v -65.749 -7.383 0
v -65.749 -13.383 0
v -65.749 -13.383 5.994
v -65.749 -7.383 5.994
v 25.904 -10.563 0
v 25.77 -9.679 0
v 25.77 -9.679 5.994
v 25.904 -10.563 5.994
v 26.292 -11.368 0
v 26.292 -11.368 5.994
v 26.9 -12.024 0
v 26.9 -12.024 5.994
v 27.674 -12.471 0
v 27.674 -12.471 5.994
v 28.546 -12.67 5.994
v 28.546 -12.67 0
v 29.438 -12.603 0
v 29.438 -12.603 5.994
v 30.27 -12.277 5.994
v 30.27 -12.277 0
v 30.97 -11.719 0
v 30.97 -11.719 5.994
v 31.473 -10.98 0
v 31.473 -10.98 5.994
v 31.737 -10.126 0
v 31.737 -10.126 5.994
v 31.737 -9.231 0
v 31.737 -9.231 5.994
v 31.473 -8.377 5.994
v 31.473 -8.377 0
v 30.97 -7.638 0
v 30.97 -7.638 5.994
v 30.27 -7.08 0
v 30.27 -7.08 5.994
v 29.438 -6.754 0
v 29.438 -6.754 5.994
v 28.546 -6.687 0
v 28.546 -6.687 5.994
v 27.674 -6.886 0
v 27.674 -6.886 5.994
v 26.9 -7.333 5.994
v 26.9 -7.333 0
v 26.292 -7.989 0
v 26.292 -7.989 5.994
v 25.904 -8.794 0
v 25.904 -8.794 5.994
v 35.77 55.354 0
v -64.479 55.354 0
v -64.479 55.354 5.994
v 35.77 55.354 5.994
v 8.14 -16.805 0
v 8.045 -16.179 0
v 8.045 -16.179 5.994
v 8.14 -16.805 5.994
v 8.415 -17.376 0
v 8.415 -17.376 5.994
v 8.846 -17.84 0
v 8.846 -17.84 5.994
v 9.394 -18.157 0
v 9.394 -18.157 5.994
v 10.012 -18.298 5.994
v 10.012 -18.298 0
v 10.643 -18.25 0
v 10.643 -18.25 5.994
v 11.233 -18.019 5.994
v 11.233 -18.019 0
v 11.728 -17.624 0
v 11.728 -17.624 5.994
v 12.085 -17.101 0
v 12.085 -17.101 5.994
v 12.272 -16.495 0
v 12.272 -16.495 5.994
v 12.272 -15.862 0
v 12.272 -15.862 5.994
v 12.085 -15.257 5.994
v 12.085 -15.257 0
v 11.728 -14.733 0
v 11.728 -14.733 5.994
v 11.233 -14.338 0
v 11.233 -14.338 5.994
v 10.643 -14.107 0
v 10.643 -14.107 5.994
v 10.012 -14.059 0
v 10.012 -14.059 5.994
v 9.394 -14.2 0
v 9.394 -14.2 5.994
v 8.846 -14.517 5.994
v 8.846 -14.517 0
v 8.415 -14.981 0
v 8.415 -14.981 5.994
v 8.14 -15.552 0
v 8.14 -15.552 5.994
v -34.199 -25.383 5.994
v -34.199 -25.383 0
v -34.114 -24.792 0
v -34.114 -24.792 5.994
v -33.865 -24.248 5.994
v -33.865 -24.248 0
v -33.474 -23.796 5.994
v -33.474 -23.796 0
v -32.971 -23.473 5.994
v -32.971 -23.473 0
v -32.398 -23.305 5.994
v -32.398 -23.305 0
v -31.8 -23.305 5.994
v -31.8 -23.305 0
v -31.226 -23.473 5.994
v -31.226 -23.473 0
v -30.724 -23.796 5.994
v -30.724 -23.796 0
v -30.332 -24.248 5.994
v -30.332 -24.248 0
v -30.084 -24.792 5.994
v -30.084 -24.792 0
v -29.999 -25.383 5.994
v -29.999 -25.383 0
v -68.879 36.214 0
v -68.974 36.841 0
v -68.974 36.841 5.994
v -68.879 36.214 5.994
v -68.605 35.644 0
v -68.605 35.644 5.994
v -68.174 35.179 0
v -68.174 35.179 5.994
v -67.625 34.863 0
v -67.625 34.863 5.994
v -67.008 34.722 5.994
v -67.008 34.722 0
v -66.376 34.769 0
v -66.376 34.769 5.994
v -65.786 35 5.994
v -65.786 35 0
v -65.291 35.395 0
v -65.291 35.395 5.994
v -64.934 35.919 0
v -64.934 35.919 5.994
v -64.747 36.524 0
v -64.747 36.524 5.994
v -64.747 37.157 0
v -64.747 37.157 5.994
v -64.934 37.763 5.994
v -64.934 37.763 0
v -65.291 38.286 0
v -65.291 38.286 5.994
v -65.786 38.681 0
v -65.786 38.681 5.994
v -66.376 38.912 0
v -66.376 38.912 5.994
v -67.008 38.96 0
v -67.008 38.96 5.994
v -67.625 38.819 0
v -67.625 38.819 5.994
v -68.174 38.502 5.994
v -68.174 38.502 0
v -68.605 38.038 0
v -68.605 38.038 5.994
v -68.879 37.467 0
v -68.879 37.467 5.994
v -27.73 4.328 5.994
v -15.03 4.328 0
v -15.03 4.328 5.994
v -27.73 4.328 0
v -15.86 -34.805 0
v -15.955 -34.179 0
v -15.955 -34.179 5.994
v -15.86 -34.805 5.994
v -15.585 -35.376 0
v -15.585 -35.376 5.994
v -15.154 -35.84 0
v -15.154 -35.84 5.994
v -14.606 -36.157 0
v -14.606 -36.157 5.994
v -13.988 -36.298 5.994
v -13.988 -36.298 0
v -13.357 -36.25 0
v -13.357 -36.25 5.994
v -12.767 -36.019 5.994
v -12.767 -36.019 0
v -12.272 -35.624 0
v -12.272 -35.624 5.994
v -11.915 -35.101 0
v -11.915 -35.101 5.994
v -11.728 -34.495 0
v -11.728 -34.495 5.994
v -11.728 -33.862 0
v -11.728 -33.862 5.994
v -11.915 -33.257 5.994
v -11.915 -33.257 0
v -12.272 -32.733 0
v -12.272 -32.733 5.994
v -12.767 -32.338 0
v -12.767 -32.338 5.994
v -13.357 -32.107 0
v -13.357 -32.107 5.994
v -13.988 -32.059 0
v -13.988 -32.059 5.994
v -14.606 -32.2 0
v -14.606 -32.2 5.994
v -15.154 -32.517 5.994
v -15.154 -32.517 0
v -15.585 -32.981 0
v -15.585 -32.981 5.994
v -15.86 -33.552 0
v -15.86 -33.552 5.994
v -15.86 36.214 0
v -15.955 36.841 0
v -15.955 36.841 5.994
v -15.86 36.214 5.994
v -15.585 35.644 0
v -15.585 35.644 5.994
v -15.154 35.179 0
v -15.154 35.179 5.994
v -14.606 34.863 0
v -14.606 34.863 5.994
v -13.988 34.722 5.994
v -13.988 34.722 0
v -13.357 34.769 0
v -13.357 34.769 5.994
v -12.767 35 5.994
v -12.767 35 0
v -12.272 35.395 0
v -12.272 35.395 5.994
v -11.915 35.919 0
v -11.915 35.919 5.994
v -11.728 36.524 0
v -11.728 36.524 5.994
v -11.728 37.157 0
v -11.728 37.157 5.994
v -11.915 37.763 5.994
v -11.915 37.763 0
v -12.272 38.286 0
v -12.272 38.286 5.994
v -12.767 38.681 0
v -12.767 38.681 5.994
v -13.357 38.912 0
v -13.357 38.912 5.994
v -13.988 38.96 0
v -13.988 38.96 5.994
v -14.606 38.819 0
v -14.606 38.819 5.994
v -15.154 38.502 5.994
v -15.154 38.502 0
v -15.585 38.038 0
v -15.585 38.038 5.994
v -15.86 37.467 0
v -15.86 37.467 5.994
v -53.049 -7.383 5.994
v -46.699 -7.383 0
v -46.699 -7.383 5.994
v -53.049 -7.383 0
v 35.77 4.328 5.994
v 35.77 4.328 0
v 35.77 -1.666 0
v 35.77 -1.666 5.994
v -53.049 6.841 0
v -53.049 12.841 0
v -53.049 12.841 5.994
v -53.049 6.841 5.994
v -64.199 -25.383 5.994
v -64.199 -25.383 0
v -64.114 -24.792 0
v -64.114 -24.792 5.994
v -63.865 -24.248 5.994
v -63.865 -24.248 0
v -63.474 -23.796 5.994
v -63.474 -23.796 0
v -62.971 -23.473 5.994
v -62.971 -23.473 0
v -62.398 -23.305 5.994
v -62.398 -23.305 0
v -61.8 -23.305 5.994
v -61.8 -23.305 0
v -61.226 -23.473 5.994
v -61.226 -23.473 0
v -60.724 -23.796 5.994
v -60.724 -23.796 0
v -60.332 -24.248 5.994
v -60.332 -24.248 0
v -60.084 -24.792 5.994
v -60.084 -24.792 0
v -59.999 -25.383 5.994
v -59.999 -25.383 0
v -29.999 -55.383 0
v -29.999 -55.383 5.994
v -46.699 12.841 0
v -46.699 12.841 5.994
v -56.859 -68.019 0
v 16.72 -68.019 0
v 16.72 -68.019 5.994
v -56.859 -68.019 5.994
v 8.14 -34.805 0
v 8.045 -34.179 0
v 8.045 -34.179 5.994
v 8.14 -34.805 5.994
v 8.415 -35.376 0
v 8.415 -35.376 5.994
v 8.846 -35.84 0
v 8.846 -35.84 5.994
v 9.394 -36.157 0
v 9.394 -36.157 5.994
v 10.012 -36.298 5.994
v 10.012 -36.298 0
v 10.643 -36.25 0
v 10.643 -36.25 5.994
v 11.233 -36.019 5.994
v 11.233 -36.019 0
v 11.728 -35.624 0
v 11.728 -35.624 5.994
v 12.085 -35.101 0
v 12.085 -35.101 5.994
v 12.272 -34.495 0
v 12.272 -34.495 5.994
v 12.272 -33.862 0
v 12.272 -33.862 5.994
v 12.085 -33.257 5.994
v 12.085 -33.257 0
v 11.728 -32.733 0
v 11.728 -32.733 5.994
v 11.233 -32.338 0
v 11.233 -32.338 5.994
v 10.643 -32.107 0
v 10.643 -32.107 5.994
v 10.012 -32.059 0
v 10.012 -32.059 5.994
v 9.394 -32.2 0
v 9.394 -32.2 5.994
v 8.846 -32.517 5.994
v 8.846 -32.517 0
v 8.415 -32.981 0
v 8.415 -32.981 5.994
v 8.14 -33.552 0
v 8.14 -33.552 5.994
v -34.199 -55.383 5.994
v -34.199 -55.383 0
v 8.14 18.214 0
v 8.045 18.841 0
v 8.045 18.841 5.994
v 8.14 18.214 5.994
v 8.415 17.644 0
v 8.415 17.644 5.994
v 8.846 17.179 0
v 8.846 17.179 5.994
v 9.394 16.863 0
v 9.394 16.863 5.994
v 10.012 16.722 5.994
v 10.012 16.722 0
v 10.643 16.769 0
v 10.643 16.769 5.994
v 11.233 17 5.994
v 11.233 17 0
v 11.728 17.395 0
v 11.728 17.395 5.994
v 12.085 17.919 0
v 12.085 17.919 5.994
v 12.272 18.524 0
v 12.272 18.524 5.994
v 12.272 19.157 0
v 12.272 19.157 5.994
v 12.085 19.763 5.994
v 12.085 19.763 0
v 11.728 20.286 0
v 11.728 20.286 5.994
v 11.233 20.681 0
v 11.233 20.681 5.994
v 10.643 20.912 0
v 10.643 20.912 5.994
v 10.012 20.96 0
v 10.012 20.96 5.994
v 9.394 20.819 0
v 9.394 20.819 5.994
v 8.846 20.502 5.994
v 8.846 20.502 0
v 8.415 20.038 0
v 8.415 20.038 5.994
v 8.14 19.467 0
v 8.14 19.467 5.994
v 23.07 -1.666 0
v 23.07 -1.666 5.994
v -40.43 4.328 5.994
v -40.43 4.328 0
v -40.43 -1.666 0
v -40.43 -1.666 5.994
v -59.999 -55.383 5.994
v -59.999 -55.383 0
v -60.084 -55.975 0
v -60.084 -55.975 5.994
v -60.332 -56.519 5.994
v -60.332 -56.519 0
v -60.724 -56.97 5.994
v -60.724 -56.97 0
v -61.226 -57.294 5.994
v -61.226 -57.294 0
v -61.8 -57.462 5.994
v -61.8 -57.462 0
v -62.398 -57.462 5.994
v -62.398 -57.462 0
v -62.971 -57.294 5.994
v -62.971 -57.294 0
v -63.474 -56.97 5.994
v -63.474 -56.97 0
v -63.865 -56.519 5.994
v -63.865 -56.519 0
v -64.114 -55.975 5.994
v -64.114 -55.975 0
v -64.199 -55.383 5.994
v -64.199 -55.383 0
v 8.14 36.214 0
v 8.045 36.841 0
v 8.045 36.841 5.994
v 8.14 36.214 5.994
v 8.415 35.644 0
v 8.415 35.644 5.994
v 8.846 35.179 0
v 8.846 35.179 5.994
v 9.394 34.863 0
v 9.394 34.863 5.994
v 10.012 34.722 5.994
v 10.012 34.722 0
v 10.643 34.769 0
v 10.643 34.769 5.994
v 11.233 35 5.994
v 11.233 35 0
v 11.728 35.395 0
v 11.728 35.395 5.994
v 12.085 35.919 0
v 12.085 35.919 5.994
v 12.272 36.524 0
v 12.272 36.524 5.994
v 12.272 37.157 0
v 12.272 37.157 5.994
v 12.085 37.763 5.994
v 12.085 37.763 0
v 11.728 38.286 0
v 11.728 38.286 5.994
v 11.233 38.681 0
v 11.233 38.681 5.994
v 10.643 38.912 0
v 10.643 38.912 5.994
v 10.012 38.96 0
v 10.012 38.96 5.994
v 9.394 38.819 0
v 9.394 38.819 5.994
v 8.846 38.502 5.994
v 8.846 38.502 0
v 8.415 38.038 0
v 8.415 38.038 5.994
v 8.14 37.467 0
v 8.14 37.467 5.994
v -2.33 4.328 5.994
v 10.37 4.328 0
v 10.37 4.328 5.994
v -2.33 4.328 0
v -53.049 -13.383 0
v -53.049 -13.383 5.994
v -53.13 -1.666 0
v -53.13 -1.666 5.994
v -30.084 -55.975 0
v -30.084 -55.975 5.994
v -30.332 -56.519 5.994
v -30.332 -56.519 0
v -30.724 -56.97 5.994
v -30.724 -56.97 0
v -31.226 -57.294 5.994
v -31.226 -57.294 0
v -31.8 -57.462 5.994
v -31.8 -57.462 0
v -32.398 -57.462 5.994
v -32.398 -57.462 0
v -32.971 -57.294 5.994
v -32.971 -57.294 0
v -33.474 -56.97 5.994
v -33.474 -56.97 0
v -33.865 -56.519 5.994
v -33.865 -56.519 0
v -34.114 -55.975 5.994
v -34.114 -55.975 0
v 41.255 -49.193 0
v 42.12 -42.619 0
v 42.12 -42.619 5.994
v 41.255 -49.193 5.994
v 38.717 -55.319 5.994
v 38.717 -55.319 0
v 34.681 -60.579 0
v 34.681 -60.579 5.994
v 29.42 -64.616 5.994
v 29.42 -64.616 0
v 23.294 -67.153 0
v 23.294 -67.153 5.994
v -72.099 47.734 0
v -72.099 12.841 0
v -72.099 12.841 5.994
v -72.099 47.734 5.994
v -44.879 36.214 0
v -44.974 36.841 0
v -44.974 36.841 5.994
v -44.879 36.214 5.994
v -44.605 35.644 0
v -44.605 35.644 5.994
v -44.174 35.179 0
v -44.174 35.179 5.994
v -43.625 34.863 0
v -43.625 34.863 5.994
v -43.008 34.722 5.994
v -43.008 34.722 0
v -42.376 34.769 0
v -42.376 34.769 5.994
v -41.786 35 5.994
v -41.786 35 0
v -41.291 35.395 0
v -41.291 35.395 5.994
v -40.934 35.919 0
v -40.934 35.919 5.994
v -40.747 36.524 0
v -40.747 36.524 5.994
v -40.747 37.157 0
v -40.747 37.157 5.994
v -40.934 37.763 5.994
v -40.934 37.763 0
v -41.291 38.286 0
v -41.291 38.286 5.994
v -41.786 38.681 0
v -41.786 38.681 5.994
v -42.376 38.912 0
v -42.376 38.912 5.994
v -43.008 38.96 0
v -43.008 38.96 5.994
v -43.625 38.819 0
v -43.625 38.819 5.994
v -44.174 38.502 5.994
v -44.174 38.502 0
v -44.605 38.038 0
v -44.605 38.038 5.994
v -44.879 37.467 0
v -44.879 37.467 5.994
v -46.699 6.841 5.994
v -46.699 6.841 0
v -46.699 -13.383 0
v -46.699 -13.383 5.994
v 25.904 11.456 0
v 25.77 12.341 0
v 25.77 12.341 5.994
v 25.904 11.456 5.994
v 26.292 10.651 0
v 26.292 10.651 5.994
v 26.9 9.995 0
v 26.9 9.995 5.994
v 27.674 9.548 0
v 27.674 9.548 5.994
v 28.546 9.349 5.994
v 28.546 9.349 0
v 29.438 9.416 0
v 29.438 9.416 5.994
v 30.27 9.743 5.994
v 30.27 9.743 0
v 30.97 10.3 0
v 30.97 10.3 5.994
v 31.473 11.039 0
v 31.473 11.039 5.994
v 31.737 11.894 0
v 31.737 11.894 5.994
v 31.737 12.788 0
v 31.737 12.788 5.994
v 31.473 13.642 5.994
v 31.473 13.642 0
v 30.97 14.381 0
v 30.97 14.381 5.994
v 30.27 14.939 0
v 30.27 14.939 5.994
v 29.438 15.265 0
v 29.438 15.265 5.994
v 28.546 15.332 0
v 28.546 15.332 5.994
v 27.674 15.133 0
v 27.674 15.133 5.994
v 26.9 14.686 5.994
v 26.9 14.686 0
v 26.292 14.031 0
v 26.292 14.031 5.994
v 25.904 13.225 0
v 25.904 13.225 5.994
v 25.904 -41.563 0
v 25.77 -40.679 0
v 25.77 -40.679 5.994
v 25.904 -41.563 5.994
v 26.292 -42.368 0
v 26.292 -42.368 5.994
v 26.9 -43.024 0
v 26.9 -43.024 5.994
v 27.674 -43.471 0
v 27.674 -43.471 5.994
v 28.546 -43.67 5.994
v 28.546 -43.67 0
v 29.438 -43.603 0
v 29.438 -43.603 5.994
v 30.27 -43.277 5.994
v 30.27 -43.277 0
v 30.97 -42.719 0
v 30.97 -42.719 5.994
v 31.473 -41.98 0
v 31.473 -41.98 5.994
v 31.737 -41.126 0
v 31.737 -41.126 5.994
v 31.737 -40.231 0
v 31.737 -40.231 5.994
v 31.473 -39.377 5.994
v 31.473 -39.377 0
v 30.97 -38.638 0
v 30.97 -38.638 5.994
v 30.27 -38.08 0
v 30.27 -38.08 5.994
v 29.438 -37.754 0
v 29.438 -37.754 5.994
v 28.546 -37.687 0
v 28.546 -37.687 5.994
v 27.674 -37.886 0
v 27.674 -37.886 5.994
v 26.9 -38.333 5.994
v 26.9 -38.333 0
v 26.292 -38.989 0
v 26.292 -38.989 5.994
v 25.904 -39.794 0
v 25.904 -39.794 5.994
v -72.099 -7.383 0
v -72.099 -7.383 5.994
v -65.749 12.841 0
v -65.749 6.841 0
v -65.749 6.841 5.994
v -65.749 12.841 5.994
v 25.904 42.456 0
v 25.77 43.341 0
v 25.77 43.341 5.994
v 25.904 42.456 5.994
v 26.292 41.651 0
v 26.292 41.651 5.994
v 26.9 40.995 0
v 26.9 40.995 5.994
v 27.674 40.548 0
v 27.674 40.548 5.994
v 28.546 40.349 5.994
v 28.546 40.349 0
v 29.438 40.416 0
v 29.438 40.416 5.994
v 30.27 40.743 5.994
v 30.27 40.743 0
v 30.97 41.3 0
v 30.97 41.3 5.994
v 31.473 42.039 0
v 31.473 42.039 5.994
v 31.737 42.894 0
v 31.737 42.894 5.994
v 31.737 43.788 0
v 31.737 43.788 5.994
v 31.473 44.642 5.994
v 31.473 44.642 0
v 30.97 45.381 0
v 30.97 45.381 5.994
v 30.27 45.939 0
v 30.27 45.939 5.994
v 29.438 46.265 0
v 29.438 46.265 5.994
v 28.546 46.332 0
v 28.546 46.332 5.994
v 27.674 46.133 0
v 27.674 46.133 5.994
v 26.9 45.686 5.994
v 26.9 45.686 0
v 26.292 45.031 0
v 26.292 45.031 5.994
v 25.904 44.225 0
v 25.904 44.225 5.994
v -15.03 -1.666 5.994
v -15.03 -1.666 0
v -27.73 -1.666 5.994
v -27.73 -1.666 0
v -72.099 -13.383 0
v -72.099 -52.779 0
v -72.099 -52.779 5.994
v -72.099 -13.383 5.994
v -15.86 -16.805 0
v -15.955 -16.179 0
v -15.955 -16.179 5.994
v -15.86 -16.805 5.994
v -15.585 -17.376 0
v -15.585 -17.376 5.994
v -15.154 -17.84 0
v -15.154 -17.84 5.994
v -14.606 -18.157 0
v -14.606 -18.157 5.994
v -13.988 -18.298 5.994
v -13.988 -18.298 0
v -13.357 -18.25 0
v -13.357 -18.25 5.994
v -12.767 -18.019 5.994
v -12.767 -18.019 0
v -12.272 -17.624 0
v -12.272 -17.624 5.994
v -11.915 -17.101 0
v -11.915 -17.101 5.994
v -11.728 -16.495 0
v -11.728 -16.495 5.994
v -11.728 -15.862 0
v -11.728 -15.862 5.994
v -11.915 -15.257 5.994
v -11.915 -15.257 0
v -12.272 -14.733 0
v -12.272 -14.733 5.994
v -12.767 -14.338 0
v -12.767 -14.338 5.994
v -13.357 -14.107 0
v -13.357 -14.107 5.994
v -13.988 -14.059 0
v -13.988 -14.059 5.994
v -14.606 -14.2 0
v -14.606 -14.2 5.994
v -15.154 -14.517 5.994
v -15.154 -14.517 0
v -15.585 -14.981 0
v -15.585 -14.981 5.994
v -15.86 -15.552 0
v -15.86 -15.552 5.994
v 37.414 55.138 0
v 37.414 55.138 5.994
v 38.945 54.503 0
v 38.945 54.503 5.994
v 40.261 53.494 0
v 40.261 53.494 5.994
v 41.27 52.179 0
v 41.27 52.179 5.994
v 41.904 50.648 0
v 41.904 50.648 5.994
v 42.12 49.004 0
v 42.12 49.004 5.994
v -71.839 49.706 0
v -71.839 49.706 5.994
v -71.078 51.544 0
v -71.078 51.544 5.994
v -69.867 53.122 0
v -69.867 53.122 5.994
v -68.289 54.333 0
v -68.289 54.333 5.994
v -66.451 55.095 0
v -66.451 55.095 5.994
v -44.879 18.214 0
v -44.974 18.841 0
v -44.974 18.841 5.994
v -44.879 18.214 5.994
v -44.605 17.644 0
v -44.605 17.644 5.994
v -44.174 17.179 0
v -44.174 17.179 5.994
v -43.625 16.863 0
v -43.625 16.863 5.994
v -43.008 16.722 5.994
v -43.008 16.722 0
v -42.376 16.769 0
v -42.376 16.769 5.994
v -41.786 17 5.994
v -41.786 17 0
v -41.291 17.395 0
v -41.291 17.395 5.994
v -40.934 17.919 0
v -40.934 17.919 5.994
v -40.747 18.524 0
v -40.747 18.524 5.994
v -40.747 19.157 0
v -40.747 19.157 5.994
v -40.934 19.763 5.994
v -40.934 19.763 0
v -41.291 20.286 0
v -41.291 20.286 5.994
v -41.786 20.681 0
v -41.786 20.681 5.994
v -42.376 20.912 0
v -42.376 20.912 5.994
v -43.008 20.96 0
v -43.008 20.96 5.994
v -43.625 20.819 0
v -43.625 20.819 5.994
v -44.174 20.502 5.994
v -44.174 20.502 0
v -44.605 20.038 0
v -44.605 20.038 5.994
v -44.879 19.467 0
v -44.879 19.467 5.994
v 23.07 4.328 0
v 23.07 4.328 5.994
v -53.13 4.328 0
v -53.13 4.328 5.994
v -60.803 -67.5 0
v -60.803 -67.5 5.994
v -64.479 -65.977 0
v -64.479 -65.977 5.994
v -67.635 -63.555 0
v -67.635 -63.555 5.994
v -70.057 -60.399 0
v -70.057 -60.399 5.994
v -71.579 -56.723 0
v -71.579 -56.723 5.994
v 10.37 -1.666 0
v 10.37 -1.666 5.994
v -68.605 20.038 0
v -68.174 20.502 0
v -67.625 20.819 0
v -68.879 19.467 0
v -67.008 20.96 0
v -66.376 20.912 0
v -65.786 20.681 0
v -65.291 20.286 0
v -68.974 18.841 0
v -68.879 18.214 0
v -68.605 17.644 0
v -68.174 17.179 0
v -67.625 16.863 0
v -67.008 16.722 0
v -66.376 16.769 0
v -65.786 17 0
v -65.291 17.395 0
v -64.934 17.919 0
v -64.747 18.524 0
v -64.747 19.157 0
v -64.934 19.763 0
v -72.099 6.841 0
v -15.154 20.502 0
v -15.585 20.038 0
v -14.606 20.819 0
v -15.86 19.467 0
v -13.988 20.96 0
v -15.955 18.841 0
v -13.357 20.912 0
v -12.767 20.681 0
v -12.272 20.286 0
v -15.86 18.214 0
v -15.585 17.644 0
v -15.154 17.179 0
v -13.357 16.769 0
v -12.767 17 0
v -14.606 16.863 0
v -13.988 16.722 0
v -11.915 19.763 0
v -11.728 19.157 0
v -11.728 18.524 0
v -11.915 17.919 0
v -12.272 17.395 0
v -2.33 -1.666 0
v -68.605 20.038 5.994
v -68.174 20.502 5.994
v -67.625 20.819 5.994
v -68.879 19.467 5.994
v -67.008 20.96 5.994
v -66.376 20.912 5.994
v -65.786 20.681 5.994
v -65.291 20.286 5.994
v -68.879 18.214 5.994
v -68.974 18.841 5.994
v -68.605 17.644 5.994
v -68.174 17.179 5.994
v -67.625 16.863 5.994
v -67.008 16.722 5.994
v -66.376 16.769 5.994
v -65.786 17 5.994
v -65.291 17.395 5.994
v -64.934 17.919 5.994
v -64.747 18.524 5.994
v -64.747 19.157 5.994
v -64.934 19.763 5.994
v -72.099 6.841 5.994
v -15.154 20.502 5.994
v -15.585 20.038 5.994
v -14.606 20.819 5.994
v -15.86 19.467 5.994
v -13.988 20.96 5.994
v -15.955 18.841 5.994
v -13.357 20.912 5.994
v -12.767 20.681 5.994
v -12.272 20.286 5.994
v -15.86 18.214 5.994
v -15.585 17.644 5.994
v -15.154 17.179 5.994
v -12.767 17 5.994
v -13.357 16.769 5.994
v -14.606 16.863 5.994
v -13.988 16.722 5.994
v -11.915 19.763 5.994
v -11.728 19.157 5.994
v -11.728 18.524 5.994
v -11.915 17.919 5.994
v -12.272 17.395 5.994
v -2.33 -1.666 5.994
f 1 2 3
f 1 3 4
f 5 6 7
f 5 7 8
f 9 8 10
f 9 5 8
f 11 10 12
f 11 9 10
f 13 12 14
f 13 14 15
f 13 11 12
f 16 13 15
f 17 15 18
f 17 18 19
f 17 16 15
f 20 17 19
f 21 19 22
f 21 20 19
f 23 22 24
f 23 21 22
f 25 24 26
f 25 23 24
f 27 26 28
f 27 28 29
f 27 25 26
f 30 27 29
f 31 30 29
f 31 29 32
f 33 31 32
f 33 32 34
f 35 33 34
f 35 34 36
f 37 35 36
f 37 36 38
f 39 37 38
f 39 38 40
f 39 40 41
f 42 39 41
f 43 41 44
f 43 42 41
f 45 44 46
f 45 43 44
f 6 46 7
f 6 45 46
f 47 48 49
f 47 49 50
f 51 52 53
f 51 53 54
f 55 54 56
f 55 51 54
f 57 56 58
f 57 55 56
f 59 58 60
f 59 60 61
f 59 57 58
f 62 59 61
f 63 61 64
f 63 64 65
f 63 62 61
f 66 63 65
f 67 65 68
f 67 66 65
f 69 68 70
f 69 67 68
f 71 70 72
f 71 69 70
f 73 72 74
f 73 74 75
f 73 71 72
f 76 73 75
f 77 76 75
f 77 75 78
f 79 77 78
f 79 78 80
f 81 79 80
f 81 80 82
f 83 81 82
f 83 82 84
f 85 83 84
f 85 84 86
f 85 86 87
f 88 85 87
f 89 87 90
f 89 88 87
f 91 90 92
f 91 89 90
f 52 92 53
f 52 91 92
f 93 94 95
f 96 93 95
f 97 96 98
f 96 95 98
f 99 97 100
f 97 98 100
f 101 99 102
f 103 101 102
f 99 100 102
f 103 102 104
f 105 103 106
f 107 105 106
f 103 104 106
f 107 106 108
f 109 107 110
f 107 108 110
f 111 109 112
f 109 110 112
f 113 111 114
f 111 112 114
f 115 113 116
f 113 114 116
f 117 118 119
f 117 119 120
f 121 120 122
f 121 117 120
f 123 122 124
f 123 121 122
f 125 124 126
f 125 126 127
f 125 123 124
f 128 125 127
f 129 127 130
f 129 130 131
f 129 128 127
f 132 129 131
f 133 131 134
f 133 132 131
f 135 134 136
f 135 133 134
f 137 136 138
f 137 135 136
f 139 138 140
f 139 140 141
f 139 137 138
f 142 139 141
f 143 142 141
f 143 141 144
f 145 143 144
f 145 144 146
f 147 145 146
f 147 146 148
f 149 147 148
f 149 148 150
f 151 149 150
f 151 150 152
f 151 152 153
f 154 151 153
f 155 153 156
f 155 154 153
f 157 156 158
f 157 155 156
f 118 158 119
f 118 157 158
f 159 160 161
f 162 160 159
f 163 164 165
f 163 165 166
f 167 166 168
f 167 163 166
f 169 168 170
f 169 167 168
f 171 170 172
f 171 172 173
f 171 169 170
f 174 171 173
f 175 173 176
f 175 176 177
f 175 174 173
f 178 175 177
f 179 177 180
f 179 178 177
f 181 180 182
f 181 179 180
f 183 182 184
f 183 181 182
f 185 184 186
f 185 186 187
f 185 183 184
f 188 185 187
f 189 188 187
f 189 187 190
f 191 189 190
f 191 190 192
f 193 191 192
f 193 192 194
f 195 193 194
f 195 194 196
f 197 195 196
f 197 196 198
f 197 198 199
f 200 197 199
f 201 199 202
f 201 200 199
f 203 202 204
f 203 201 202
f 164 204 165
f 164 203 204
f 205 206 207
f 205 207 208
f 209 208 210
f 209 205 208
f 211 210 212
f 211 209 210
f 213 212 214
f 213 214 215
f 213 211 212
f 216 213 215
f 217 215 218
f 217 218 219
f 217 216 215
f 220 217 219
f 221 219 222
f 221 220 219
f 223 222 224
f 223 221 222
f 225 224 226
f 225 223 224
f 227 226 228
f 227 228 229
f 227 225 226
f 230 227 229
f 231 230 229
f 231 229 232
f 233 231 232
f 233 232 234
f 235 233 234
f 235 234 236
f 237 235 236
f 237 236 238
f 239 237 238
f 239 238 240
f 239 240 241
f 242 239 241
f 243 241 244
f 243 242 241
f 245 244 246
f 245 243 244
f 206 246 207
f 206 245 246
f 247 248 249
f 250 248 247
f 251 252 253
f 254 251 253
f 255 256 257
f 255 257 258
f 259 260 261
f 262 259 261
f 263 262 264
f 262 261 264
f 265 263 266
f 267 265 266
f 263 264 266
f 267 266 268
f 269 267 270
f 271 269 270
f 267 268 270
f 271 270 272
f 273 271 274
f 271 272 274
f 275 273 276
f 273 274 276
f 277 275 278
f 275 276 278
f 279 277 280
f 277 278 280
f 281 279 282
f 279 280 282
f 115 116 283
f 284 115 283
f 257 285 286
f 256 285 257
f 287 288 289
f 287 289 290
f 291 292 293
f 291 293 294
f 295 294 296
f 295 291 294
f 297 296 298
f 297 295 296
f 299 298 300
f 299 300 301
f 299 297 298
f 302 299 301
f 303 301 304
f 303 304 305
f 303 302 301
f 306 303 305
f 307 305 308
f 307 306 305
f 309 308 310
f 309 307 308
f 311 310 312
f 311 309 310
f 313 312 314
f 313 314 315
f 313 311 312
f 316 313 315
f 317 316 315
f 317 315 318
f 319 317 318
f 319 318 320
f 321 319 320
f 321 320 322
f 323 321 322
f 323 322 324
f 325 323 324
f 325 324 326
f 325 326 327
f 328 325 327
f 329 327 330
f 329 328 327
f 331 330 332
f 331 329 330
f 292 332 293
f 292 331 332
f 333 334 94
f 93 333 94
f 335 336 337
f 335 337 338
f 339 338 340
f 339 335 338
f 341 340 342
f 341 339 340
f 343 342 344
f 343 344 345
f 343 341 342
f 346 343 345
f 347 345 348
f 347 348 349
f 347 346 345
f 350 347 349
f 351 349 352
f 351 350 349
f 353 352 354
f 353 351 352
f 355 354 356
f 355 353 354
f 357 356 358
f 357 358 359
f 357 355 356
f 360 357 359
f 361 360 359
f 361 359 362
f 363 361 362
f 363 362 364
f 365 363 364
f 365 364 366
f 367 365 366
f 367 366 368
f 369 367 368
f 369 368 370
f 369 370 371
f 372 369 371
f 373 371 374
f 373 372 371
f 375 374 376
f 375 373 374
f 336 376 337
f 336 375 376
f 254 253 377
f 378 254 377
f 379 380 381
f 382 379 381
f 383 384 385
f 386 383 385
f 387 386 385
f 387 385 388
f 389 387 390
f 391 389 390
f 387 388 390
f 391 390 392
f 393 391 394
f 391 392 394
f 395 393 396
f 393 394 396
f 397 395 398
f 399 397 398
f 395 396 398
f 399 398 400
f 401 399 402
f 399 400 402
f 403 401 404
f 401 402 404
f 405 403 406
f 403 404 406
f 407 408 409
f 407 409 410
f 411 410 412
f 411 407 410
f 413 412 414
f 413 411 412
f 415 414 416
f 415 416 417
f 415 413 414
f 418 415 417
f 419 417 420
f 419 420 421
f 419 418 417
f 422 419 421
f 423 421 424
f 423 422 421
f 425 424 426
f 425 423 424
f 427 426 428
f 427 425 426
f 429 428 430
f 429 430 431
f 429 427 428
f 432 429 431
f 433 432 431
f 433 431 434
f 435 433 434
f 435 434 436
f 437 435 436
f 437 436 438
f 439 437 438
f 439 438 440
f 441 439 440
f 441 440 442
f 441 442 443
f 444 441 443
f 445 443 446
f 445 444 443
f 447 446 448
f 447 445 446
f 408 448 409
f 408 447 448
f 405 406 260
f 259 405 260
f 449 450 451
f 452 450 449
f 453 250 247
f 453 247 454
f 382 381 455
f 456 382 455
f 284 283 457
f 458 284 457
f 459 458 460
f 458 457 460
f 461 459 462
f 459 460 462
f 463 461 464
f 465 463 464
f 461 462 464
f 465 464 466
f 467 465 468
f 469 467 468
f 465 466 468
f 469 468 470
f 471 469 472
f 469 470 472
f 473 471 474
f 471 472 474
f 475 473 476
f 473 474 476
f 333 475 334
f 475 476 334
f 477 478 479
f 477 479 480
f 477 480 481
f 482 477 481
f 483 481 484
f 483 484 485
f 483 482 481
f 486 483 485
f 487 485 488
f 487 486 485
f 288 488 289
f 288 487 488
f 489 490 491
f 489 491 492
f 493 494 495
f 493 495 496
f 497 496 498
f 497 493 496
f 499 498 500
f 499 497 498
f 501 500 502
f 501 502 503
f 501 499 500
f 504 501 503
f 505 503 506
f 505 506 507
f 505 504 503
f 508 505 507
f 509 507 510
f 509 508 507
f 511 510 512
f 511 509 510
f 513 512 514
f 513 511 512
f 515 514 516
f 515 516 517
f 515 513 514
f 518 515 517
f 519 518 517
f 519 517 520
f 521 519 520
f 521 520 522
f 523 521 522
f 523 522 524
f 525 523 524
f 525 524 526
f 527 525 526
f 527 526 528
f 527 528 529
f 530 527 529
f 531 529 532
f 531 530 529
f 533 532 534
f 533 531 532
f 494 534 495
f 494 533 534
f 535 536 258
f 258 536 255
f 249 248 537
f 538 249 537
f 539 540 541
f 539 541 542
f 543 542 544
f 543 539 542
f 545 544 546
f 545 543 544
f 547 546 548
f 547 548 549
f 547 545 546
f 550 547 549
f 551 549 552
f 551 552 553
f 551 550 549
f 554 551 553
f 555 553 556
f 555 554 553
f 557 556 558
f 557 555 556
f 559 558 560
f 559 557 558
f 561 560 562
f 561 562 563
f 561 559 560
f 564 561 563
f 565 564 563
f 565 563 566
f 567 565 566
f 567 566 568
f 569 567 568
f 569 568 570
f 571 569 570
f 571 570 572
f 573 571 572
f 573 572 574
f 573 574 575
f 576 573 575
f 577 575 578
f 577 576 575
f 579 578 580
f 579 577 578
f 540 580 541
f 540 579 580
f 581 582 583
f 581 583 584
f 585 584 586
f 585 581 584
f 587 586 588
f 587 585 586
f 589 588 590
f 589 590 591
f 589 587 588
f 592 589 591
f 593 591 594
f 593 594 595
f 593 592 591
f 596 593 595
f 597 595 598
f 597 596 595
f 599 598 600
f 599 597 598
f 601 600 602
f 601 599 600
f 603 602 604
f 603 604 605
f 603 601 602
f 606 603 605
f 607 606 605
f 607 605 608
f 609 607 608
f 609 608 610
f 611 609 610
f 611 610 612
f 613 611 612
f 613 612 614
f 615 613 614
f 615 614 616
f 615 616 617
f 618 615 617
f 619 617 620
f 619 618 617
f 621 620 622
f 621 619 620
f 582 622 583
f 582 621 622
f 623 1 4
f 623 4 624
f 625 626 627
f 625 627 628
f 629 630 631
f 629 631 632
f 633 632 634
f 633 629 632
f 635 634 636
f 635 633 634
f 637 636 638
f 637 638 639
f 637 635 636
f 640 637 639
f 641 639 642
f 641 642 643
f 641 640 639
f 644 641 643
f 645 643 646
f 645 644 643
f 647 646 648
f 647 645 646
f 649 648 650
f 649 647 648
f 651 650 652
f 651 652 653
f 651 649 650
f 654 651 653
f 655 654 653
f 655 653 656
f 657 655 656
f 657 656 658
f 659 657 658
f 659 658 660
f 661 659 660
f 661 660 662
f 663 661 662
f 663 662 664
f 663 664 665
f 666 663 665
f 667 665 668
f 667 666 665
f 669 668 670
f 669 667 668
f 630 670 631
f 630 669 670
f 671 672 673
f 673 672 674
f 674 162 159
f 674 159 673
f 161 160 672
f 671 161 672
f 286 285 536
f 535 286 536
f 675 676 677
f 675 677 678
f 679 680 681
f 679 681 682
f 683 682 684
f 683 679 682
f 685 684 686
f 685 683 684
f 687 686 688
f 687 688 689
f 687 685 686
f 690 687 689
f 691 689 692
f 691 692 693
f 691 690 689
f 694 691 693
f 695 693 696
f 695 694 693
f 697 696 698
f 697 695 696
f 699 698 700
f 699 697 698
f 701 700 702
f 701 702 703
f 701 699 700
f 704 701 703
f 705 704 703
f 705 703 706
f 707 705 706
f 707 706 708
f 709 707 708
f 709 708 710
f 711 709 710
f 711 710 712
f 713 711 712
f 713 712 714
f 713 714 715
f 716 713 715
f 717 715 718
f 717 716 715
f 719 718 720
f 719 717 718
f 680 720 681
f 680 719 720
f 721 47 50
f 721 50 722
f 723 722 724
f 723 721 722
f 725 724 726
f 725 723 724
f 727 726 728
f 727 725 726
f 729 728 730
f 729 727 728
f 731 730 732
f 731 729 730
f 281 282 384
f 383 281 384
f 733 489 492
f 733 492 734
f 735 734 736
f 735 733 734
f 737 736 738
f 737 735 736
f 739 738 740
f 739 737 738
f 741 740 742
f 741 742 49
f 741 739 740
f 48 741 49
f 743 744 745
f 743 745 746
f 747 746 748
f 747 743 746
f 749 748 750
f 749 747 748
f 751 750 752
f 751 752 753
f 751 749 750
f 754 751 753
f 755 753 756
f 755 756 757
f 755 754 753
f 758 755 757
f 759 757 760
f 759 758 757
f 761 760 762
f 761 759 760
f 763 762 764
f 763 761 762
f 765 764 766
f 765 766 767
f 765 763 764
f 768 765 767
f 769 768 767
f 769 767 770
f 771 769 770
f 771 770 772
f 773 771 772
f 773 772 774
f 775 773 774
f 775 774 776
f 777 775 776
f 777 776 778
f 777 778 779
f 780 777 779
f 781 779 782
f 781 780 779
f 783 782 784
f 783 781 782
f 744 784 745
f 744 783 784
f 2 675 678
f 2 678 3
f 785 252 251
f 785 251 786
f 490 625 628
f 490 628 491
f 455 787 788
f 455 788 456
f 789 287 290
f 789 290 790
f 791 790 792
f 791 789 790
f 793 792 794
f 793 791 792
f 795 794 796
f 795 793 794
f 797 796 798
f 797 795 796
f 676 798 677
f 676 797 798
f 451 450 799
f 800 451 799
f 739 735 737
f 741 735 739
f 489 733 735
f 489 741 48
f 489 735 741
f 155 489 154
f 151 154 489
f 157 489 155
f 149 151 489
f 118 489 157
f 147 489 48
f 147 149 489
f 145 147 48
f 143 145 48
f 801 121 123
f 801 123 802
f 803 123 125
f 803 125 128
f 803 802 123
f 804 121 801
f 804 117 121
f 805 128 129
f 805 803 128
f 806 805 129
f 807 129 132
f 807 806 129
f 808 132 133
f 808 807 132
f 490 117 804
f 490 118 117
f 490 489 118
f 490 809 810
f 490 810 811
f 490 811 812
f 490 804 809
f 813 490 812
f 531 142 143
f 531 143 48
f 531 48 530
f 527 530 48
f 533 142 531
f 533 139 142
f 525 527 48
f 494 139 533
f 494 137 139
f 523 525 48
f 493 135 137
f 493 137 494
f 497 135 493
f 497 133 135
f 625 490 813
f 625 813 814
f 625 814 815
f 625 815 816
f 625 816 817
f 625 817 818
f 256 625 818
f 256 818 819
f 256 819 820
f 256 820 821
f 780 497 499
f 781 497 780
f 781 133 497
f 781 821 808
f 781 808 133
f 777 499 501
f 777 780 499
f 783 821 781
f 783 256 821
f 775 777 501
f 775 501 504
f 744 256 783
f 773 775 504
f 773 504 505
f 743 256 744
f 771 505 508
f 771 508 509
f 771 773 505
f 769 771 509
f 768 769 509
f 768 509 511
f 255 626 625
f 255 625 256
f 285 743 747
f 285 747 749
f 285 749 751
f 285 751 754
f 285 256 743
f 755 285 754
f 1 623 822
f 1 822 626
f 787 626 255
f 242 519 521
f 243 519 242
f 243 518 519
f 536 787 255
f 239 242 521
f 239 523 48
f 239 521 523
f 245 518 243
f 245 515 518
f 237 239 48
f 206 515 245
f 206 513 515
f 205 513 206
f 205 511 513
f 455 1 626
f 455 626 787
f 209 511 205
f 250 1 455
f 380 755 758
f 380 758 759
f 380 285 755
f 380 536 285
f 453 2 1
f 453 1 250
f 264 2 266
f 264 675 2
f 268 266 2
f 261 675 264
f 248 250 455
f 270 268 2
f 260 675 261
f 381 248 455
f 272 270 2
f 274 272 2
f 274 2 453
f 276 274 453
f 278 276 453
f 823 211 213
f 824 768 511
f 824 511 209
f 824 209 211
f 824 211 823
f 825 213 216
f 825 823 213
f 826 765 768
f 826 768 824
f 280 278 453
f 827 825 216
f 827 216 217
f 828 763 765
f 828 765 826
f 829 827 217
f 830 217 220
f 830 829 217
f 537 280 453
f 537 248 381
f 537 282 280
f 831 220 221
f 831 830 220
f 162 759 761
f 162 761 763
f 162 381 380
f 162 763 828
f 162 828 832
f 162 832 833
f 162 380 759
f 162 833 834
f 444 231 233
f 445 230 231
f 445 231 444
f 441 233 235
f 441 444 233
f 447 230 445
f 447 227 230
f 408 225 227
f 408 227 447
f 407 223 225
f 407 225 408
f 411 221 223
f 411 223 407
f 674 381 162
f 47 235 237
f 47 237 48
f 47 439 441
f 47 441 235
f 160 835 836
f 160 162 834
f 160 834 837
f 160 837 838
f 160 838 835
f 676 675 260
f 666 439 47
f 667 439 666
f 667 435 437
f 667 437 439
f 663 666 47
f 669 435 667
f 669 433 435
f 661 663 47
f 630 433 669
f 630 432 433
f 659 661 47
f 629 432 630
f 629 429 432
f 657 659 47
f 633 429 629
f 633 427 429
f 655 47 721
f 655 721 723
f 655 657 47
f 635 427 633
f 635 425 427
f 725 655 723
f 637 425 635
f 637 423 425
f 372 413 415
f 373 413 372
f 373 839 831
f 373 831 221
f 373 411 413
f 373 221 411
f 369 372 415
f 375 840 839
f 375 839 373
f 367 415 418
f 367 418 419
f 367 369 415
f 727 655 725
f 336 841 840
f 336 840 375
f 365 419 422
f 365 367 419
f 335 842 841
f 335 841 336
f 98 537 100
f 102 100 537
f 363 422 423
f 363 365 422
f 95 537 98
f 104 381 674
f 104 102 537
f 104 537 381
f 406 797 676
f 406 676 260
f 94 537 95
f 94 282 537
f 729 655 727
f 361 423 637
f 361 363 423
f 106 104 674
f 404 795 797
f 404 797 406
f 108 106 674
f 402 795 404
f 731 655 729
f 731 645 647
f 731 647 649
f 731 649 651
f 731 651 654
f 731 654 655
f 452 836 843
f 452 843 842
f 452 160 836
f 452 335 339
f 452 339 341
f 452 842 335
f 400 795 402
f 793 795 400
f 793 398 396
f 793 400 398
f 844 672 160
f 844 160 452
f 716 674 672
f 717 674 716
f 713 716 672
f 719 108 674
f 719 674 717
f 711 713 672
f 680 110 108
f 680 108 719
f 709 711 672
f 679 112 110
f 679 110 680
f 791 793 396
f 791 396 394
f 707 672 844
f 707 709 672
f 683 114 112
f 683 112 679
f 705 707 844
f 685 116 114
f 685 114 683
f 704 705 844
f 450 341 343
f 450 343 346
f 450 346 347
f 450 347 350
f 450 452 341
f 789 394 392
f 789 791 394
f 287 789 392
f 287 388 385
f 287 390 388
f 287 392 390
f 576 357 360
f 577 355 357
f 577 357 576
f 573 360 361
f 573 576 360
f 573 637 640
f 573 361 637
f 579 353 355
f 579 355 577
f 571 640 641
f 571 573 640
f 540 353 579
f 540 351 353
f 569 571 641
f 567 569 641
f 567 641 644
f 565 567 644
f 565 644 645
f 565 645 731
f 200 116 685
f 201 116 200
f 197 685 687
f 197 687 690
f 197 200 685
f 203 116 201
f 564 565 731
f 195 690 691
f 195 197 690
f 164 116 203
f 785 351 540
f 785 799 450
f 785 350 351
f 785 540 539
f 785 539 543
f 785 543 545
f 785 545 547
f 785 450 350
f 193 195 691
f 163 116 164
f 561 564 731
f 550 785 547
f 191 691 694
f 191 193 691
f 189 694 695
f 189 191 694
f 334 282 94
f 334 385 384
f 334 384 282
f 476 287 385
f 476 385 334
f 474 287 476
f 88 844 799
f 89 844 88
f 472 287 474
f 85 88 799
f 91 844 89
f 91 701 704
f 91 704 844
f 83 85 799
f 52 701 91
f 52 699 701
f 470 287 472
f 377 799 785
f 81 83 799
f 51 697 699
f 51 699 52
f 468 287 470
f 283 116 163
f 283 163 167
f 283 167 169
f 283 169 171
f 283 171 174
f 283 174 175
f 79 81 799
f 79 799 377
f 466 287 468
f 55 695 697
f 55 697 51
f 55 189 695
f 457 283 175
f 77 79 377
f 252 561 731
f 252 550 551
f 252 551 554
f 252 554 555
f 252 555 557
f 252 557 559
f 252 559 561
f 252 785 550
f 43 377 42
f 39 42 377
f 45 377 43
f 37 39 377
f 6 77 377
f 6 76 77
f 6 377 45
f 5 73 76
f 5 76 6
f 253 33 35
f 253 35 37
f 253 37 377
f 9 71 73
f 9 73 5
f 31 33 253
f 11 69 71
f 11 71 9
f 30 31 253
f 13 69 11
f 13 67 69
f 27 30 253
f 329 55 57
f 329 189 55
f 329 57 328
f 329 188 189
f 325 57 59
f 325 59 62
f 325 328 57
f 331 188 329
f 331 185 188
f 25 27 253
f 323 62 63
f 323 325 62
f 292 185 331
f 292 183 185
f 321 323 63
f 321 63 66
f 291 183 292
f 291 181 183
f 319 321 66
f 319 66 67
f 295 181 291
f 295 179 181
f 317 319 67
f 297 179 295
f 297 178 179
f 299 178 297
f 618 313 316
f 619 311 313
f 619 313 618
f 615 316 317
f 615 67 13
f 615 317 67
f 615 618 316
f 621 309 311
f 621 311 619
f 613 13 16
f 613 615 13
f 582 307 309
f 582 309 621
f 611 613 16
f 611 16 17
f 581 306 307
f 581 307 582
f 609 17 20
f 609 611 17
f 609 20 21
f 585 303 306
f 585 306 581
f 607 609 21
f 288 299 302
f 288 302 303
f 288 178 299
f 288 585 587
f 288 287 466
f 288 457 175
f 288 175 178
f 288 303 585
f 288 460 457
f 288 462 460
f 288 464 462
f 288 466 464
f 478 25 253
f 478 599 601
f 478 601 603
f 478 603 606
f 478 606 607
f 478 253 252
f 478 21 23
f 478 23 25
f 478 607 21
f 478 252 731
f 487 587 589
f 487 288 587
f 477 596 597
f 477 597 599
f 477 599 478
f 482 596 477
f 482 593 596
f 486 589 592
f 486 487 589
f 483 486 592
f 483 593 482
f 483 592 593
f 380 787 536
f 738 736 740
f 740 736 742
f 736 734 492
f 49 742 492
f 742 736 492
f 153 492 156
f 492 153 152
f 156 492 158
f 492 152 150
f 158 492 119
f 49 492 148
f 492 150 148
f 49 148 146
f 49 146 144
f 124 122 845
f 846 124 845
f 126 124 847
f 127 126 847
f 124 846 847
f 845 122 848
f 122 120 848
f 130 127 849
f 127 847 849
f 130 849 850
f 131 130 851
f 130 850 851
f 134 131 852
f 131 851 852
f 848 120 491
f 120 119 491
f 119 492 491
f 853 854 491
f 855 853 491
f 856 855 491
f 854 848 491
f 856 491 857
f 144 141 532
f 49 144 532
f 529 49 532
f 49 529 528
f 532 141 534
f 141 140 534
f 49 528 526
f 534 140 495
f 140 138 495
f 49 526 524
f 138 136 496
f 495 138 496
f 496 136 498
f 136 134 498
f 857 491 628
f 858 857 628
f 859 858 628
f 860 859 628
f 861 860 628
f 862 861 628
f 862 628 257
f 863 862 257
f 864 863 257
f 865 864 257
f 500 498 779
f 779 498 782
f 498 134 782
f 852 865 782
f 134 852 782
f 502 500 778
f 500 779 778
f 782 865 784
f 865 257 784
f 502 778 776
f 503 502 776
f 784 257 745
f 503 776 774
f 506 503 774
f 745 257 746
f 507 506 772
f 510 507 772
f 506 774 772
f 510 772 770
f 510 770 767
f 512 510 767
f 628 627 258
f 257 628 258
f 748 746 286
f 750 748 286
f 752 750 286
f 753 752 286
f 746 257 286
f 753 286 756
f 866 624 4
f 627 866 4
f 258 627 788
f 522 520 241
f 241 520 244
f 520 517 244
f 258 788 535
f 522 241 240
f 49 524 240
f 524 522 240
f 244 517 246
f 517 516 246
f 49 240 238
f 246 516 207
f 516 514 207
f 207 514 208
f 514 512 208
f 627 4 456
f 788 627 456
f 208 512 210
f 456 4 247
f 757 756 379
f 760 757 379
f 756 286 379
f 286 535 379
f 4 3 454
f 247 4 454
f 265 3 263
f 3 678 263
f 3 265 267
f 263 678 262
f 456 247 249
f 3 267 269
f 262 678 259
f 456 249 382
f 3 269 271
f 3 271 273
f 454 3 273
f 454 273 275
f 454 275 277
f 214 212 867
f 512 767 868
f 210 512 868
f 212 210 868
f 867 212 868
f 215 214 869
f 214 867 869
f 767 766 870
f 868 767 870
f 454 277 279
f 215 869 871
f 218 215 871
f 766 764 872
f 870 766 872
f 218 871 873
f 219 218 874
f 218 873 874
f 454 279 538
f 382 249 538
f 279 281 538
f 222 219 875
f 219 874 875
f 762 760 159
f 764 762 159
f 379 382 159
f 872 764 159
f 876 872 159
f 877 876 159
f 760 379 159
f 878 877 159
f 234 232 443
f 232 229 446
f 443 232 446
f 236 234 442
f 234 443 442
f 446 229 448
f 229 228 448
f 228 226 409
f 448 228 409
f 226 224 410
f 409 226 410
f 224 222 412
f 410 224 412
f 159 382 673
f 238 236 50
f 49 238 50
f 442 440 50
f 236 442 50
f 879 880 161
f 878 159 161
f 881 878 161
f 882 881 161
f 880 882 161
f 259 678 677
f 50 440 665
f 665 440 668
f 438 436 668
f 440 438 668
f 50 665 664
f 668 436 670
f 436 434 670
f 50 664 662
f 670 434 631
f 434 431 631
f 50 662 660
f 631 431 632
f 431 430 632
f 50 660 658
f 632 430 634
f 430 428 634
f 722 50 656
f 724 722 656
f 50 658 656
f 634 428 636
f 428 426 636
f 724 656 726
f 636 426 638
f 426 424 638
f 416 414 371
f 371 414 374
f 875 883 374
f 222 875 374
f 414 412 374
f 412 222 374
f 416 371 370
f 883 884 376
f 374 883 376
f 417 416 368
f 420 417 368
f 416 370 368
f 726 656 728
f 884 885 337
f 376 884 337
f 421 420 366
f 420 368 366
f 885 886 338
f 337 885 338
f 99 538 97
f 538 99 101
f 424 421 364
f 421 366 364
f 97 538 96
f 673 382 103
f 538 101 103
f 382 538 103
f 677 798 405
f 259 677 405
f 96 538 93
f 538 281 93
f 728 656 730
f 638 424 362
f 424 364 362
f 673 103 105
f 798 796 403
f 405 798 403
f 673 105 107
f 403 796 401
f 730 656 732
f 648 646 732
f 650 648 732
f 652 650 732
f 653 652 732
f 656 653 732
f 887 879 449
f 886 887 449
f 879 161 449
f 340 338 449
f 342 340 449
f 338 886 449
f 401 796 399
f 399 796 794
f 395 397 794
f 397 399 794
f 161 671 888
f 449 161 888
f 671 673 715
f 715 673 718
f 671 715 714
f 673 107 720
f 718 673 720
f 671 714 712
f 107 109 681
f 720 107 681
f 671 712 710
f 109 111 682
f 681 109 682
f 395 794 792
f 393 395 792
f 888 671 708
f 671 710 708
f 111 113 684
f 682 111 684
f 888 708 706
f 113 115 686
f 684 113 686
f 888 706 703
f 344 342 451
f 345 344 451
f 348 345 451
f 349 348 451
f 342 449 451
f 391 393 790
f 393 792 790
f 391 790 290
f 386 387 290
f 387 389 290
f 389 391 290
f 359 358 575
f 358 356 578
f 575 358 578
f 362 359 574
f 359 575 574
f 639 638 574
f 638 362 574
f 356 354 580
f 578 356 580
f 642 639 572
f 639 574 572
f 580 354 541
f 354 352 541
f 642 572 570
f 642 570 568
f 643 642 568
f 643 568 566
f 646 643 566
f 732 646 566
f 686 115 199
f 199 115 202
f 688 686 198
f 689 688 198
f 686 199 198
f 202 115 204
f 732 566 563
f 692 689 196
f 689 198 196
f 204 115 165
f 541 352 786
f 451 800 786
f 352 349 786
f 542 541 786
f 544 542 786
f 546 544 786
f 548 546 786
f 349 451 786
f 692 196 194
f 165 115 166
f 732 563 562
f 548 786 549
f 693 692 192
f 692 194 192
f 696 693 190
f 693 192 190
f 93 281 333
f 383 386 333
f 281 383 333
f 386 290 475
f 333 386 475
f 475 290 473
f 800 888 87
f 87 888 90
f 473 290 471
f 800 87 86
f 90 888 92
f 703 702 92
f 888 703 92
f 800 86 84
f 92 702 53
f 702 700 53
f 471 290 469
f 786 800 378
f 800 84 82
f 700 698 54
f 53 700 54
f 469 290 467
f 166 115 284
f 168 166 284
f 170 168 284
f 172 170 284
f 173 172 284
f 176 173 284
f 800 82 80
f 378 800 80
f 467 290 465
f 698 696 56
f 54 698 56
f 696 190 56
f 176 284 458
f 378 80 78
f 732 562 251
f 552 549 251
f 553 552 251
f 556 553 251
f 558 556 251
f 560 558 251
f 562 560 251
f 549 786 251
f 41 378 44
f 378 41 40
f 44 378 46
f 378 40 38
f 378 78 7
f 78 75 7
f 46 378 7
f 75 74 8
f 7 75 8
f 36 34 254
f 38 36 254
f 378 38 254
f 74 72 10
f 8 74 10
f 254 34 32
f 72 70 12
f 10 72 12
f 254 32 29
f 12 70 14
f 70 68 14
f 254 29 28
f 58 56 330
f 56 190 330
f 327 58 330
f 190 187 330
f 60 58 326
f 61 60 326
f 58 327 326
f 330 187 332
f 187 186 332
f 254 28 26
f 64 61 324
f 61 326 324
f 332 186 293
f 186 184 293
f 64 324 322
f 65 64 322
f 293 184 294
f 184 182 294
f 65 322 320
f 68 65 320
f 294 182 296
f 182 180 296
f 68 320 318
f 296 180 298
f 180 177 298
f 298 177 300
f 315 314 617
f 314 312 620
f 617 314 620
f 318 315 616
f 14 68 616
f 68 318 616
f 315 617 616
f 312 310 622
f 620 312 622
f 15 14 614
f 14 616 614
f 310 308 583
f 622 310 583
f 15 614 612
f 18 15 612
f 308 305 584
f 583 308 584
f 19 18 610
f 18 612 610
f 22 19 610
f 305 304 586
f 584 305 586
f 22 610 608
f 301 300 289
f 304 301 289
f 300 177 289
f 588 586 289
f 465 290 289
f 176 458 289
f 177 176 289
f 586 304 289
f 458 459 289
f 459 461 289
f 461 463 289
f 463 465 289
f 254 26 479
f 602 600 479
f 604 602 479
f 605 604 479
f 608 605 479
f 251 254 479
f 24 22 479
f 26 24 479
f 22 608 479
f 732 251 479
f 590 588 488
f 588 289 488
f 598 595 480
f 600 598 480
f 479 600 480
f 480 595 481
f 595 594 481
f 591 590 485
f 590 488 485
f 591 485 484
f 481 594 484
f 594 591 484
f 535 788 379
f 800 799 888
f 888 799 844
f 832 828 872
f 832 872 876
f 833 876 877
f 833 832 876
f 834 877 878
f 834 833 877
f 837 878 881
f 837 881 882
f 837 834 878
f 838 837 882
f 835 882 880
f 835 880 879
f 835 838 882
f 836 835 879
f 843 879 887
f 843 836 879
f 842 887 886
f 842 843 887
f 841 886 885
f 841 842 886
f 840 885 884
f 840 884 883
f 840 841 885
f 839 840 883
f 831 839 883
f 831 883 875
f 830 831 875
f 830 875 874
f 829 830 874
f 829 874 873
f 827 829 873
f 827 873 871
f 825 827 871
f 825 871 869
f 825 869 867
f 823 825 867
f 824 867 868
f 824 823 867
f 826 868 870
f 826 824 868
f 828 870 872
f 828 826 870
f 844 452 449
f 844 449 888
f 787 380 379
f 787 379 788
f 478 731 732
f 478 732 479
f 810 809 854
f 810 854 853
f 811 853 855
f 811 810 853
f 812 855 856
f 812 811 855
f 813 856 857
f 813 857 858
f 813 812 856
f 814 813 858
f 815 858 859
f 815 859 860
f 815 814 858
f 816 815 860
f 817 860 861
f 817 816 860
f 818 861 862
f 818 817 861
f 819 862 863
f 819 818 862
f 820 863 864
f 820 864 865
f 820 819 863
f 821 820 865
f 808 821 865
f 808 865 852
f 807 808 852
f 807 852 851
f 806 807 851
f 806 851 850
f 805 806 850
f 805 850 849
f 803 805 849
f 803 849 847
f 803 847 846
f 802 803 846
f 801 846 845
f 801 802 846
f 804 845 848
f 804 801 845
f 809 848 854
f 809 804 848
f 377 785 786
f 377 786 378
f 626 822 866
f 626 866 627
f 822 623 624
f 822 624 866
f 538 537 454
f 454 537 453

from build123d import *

# Parameters (mm, degrees)
SKETCH1_R           = 2.125
SKETCH1_R_2         = 3
SKETCH1_W           = 6.35
SKETCH1_H           = 6
SKETCH1_W_2         = 12.7
SKETCH1_H_2         = 5.9944
BOSS_EXTRUDE1_DEPTH = 5.9944


with BuildPart() as part:
    # Sketch1 → Boss-Extrude1 (new body)
    with BuildSketch(Plane(origin=(0, 0, 0), x_dir=(-1, 0, 0), z_dir=(0, 0, 1))):
        with BuildLine():
            Line((72.098749996, 7.383354962), (72.098749996, -6.840645038))
            Line((72.098749996, -6.840645038), (65.748749996, -6.840645038))
            Line((65.748749996, -6.840645038), (65.748749996, -12.840645038))
            Line((65.748749996, -12.840645038), (72.098749996, -12.840645038))
            Line((72.098749996, -12.840645038), (72.098749996, -42.840645038))
            Line((72.098749996, -42.840645038), (72.098749996, -47.734229729))
            ThreePointArc((72.098749996, -47.734229729), (69.866903669, -53.122383402), (64.478749996, -55.354229729))
            Line((64.478749996, -55.354229729), (51.652589936, -55.354229729))
            Line((51.652589936, -55.354229729), (45.302589935, -55.354229729))
            Line((45.302589935, -55.354229729), (26.252589932, -55.354229729))
            Line((26.252589932, -55.354229729), (-35.770420068, -55.354229729))
            ThreePointArc((-35.770420068, -55.354229729), (-40.260548128, -53.494357789), (-42.120420068, -49.004229729))
            Line((-42.120420068, -49.004229729), (-42.120420068, 42.61894002))
            ThreePointArc((-42.120420068, 42.61894002), (-34.68093231, 60.579452262), (-16.720420068, 68.01894002))
            Line((-16.720420068, 68.01894002), (56.858749996, 68.01894002))
            ThreePointArc((56.858749996, 68.01894002), (67.635057342, 63.555247365), (72.098749996, 52.77894002))
            Line((72.098749996, 52.77894002), (72.098749996, 13.383354962))
            Line((72.098749996, 13.383354962), (65.748749996, 13.383354962))
            Line((65.748749996, 13.383354962), (65.748749996, 7.383354962))
            Line((65.748749996, 7.383354962), (72.098749996, 7.383354962))
        make_face()
        with Locations((-10.170420063, -18.840645038)):
            Circle(SKETCH1_R, mode=Mode.SUBTRACT)
        with Locations((13.829579937, -18.840645038)):
            Circle(SKETCH1_R, mode=Mode.SUBTRACT)
        with Locations((13.829579937, -36.840645038)):
            Circle(SKETCH1_R, mode=Mode.SUBTRACT)
        with Locations((-10.170420063, -36.840645038)):
            Circle(SKETCH1_R, mode=Mode.SUBTRACT)
        with Locations((-28.770420063, -43.34064498)):
            Circle(SKETCH1_R_2, mode=Mode.SUBTRACT)
        with Locations((-28.770420063, -12.34064498)):
            Circle(SKETCH1_R_2, mode=Mode.SUBTRACT)
        with Locations((42.848749997, -18.840645038)):
            Circle(SKETCH1_R, mode=Mode.SUBTRACT)
        with Locations((66.848749997, -18.840645038)):
            Circle(SKETCH1_R, mode=Mode.SUBTRACT)
        with Locations((-28.770420063, 9.67852502)):
            Circle(SKETCH1_R_2, mode=Mode.SUBTRACT)
        with Locations((-28.770420063, 40.67852502)):
            Circle(SKETCH1_R_2, mode=Mode.SUBTRACT)
        with Locations((66.848749997, -36.840645038)):
            Circle(SKETCH1_R, mode=Mode.SUBTRACT)
        with Locations((42.848749997, -36.840645038)):
            Circle(SKETCH1_R, mode=Mode.SUBTRACT)
        with Locations((-10.170420063, 34.178525078)):
            Circle(SKETCH1_R, mode=Mode.SUBTRACT)
        with Locations((13.829579937, 34.178525078)):
            Circle(SKETCH1_R, mode=Mode.SUBTRACT)
        with Locations((-10.170420063, 16.178525078)):
            Circle(SKETCH1_R, mode=Mode.SUBTRACT)
        with Locations((13.829579937, 16.178525078)):
            Circle(SKETCH1_R, mode=Mode.SUBTRACT)
        with Locations((49.873749996, 10.383354962)):
            Rectangle(SKETCH1_W, SKETCH1_H, mode=Mode.SUBTRACT)
        with BuildLine():
            Line((34.198749996, 55.383354962), (34.198749996, 25.383354962))
            ThreePointArc((34.198749996, 25.383354962), (32.098749996, 23.283354962), (29.998749996, 25.383354962))
            Line((29.998749996, 25.383354962), (29.998749996, 55.383354962))
            ThreePointArc((29.998749996, 55.383354962), (32.098749996, 57.483354962), (34.198749996, 55.383354962))
        make_face(mode=Mode.SUBTRACT)
        with BuildLine():
            Line((64.198749996, 55.383354962), (64.198749996, 25.383354962))
            ThreePointArc((64.198749996, 25.383354962), (62.098749996, 23.283354962), (59.998749996, 25.383354962))
            Line((59.998749996, 25.383354962), (59.998749996, 55.383354962))
            ThreePointArc((59.998749996, 55.383354962), (62.098749996, 57.483354962), (64.198749996, 55.383354962))
        make_face(mode=Mode.SUBTRACT)
        with Locations((49.873749996, -9.840645038)):
            Rectangle(SKETCH1_W, SKETCH1_H, mode=Mode.SUBTRACT)
        with Locations((-29.420420063, -1.33105998)):
            Rectangle(SKETCH1_W_2, SKETCH1_H_2, mode=Mode.SUBTRACT)
        with Locations((-4.020420063, -1.33105998)):
            Rectangle(SKETCH1_W_2, SKETCH1_H_2, mode=Mode.SUBTRACT)
        with Locations((21.379579937, -1.33105998)):
            Rectangle(SKETCH1_W_2, SKETCH1_H_2, mode=Mode.SUBTRACT)
        with Locations((46.779579937, -1.33105998)):
            Rectangle(SKETCH1_W_2, SKETCH1_H_2, mode=Mode.SUBTRACT)
    extrude(amount=BOSS_EXTRUDE1_DEPTH)


solid = part.part
